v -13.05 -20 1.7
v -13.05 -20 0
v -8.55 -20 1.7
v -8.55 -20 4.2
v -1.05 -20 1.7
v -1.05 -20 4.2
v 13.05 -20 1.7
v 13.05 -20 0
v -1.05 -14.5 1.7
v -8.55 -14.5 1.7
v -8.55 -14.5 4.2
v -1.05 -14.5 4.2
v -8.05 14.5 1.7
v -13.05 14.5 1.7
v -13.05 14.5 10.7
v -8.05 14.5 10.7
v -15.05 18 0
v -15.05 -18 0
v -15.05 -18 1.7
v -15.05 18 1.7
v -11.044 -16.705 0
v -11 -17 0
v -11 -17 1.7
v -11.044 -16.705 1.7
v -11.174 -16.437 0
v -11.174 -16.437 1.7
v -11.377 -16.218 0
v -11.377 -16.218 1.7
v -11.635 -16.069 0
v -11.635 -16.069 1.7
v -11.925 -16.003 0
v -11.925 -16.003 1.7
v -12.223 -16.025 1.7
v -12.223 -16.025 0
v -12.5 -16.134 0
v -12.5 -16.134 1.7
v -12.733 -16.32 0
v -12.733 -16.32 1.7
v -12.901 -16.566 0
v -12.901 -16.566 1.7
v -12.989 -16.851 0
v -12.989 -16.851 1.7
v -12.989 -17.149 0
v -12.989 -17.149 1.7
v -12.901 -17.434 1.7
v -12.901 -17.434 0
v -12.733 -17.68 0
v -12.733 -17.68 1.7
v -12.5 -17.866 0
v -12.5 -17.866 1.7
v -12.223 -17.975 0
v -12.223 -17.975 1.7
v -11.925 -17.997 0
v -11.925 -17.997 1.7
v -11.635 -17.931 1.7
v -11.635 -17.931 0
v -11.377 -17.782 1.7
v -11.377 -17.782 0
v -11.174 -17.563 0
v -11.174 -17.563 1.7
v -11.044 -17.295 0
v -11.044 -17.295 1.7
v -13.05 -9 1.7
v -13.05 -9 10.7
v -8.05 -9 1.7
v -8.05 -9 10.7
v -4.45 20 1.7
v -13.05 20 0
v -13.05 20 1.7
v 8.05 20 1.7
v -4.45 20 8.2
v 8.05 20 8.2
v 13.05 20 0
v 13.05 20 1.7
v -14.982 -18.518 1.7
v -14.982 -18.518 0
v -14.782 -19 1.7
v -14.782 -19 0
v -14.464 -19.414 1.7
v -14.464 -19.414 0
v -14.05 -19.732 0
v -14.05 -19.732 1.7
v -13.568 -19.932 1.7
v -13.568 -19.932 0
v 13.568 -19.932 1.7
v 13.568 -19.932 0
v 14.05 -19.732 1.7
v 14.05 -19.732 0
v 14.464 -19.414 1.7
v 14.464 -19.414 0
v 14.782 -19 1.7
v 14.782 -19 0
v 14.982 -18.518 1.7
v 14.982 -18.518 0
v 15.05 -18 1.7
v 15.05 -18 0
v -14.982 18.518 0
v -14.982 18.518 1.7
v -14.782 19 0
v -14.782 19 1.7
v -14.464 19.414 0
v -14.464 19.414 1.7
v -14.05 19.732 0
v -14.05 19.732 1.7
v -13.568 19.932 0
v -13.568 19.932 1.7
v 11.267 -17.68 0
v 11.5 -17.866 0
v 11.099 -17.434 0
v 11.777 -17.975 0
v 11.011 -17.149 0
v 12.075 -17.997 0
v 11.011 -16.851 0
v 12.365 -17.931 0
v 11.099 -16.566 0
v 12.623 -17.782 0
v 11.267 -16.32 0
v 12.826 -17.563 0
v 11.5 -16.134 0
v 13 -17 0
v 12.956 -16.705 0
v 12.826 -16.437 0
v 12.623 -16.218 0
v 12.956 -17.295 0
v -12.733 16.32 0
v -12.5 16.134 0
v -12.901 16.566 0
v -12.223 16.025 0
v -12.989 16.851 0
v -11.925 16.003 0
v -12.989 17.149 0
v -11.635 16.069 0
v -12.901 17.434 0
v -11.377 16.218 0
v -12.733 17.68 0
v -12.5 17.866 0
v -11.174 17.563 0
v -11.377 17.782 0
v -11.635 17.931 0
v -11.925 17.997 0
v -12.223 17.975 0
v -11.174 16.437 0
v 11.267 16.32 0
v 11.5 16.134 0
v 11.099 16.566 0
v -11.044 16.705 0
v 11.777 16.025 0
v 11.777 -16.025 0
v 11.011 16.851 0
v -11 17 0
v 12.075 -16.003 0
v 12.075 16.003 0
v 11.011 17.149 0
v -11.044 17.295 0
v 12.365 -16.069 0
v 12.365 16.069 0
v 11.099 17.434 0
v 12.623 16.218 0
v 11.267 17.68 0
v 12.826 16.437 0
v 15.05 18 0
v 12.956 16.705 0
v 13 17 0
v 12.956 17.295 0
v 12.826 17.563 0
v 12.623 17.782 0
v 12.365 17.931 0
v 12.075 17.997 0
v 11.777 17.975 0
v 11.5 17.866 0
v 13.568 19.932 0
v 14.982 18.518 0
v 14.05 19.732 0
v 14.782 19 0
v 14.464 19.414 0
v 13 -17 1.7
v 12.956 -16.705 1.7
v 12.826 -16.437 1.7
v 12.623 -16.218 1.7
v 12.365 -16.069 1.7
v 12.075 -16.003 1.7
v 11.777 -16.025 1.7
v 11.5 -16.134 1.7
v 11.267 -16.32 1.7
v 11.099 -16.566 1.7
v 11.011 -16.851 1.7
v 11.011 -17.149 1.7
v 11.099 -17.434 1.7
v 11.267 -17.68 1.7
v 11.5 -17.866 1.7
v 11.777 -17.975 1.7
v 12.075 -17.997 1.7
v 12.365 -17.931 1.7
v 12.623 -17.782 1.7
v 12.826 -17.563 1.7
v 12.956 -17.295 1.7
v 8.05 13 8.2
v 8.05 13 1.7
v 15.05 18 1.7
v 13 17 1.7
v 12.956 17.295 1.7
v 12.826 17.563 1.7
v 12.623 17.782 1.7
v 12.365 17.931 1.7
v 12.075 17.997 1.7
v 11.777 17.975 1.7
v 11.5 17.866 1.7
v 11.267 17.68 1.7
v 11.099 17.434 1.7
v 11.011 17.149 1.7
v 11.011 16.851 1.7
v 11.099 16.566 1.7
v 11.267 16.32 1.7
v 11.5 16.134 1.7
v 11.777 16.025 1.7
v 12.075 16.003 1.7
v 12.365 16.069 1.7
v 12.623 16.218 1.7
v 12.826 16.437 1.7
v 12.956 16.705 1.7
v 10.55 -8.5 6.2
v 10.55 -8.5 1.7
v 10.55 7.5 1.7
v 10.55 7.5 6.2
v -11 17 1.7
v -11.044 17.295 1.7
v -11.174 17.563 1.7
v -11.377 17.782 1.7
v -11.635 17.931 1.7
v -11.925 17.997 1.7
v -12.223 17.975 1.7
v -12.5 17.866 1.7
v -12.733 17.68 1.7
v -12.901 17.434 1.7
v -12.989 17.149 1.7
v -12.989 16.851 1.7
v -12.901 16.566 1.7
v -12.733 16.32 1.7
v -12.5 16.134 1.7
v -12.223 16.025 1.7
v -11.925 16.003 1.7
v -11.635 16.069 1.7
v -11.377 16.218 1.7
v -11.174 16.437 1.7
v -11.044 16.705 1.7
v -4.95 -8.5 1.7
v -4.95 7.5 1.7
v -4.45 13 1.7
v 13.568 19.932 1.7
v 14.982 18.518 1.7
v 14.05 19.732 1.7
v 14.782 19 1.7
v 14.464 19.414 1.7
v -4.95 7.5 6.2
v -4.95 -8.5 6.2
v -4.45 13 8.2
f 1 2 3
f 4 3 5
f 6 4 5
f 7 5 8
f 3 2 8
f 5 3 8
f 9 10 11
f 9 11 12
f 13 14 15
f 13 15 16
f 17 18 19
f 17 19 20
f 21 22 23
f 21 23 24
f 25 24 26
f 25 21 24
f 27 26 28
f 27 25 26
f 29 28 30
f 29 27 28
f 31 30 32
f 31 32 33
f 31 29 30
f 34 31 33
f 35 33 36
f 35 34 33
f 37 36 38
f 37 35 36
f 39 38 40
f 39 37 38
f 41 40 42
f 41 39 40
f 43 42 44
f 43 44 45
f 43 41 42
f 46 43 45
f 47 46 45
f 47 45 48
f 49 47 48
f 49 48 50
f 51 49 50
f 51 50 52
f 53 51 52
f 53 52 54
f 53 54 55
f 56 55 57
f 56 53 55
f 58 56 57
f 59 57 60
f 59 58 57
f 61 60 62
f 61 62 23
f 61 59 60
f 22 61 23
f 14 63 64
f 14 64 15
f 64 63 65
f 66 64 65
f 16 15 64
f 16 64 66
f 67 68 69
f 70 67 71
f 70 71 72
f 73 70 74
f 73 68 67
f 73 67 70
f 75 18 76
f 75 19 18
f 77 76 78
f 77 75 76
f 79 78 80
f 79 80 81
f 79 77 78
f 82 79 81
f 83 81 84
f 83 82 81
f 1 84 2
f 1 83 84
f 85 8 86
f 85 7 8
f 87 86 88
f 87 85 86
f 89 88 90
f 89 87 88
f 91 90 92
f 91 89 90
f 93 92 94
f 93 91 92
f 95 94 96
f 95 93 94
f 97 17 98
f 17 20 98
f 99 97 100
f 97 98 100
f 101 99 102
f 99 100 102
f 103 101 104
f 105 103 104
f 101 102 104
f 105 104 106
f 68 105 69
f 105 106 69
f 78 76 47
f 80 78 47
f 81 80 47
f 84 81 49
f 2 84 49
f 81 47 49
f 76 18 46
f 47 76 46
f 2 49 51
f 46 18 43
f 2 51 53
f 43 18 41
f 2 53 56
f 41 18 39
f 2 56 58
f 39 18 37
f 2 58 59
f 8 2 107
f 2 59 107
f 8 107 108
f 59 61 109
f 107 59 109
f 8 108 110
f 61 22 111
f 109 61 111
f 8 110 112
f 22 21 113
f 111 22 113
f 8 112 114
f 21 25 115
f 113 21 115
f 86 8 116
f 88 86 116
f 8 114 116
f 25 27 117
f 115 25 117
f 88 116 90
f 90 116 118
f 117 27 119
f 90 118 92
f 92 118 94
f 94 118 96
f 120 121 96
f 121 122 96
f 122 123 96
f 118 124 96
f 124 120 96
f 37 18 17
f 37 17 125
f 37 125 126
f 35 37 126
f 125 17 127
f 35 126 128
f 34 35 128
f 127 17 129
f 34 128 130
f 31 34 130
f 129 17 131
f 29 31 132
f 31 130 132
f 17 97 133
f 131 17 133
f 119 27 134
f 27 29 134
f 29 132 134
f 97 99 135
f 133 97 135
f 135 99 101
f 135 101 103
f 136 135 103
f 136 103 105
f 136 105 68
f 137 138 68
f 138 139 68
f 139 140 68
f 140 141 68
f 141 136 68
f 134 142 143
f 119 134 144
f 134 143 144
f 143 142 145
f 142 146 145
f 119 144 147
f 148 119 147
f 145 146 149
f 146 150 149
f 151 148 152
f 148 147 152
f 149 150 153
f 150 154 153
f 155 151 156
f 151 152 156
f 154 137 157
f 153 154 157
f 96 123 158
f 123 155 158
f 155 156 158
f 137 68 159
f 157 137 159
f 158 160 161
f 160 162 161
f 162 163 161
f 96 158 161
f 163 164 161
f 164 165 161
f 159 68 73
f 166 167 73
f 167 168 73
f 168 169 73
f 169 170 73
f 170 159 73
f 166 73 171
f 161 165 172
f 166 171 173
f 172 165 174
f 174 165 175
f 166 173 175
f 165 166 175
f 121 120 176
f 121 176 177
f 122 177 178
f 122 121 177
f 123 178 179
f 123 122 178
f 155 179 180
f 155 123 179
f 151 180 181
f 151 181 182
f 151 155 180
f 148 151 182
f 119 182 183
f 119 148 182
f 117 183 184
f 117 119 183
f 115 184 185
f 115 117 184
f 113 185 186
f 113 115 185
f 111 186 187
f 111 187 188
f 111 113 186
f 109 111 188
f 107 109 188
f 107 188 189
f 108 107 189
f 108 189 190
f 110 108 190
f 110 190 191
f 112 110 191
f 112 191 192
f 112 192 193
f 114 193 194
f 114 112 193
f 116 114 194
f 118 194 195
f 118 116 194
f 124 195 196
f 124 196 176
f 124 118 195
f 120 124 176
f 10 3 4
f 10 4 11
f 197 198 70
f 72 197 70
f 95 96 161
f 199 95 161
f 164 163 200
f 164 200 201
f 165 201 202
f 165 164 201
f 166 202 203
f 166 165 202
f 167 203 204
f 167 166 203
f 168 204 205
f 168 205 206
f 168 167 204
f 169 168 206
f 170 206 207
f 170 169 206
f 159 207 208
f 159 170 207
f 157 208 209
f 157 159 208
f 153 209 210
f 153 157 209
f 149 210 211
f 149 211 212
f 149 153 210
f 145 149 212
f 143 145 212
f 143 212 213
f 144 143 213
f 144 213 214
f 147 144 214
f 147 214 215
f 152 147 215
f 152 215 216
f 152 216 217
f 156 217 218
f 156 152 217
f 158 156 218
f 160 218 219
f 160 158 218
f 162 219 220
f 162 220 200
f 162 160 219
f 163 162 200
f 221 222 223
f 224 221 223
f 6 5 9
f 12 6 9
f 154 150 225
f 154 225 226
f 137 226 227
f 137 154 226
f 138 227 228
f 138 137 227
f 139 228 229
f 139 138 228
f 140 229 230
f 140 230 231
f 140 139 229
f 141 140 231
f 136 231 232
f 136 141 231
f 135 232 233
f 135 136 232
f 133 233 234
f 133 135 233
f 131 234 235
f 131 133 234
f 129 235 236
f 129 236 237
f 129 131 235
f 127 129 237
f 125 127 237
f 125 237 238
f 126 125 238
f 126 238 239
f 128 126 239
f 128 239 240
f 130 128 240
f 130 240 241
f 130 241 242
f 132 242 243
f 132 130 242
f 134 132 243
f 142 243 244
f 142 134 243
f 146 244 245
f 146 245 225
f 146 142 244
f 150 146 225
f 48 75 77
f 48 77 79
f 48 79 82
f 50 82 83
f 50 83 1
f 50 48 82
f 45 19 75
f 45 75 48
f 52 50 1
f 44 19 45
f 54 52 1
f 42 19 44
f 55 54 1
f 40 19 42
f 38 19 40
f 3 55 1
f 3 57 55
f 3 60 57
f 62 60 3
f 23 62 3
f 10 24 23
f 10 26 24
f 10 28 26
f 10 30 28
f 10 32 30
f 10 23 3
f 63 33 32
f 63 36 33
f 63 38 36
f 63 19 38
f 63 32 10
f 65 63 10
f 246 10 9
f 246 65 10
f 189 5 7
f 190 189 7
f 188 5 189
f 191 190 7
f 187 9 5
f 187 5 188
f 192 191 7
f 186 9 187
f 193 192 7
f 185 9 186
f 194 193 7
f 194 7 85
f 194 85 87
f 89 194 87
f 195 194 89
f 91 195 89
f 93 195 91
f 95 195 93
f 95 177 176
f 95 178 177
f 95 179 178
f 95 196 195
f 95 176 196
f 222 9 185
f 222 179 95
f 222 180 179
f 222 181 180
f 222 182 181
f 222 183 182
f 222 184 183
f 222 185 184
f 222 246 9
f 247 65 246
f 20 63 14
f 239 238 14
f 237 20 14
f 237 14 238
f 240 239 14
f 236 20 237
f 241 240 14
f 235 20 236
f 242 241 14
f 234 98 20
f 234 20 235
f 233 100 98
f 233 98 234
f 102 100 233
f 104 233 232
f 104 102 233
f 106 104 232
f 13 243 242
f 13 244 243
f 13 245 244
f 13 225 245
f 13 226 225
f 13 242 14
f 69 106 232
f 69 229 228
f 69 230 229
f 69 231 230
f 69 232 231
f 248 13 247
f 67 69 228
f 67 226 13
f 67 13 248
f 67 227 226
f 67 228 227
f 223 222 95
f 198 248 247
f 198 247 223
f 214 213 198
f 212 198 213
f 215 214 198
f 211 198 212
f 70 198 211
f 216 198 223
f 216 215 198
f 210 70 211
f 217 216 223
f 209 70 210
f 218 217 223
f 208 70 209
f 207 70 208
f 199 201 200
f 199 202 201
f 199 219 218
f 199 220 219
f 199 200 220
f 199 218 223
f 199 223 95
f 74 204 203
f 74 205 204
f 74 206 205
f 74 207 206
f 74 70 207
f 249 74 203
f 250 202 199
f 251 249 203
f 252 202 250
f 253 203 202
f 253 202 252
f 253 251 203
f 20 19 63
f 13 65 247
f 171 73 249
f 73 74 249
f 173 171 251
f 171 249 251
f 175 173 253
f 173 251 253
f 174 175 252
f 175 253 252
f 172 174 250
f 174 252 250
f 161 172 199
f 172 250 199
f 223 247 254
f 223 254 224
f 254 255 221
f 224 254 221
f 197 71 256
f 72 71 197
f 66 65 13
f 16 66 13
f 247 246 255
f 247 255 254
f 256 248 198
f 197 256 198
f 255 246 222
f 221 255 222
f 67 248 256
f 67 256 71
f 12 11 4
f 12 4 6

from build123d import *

# Parameters (mm, degrees)
SKETCH_1_W      = 30.1
SKETCH_1_H      = 40
SKETCH_1_R      = 1
EXTRUDE_1_DEPTH = 1.7
SKETCH_2_W      = 5
SKETCH_2_H      = 23.5
EXTRUDE_2_DEPTH = 9
SKETCH_3_W      = 15.5
SKETCH_3_H      = 16
EXTRUDE_3_DEPTH = 4.5
SKETCH_4_W      = 12.5
SKETCH_4_H      = 7
EXTRUDE_4_DEPTH = 6.5
SKETCH_5_W      = 7.5
SKETCH_5_H      = 5.5
EXTRUDE_5_DEPTH = 2.5
FILLET_1_R      = 2


with BuildPart() as part:
    # 草图1 → 凸台-拉伸1 (new body)
    with BuildSketch(Plane.XY):
        Rectangle(SKETCH_1_W, SKETCH_1_H)
        with Locations((12, 17)):
            Circle(SKETCH_1_R, mode=Mode.SUBTRACT)
        with Locations((-12, 17)):
            Circle(SKETCH_1_R, mode=Mode.SUBTRACT)
        with Locations((-12, -17)):
            Circle(SKETCH_1_R, mode=Mode.SUBTRACT)
        with Locations((12, -17)):
            Circle(SKETCH_1_R, mode=Mode.SUBTRACT)
    extrude(amount=EXTRUDE_1_DEPTH)

    # 草图2 → 凸台-拉伸2 (add)
    with BuildSketch(Plane.XY.offset(1.7)):
        with Locations((-10.55, 2.75)):
            Rectangle(SKETCH_2_W, SKETCH_2_H)
    extrude(amount=EXTRUDE_2_DEPTH)

    # 草图3 → 凸台-拉伸3 (add)
    with BuildSketch(Plane.XY.offset(1.7)):
        with Locations((2.8, -0.5)):
            Rectangle(SKETCH_3_W, SKETCH_3_H)
    extrude(amount=EXTRUDE_3_DEPTH)

    # 草图4 → 凸台-拉伸4 (add)
    with BuildSketch(Plane.XY.offset(1.7)):
        with Locations((1.8, 16.5)):
            Rectangle(SKETCH_4_W, SKETCH_4_H)
    extrude(amount=EXTRUDE_4_DEPTH)

    # 草图5 → 凸台-拉伸5 (add)
    with BuildSketch(Plane.XY.offset(1.7)):
        with Locations((-4.8, -17.25)):
            Rectangle(SKETCH_5_W, SKETCH_5_H)
    extrude(amount=EXTRUDE_5_DEPTH)

    # 圆角1
    fillet_1_edges = [part.edges().sort_by_distance(p)[0] for p in [
        (-15.05, 20, 0.85),
        (15.05, 20, 0.85),
        (15.05, -20, 0.85),
        (-15.05, -20, 0.85),
    ]]
    fillet(fillet_1_edges, radius=FILLET_1_R)


solid = part.part
